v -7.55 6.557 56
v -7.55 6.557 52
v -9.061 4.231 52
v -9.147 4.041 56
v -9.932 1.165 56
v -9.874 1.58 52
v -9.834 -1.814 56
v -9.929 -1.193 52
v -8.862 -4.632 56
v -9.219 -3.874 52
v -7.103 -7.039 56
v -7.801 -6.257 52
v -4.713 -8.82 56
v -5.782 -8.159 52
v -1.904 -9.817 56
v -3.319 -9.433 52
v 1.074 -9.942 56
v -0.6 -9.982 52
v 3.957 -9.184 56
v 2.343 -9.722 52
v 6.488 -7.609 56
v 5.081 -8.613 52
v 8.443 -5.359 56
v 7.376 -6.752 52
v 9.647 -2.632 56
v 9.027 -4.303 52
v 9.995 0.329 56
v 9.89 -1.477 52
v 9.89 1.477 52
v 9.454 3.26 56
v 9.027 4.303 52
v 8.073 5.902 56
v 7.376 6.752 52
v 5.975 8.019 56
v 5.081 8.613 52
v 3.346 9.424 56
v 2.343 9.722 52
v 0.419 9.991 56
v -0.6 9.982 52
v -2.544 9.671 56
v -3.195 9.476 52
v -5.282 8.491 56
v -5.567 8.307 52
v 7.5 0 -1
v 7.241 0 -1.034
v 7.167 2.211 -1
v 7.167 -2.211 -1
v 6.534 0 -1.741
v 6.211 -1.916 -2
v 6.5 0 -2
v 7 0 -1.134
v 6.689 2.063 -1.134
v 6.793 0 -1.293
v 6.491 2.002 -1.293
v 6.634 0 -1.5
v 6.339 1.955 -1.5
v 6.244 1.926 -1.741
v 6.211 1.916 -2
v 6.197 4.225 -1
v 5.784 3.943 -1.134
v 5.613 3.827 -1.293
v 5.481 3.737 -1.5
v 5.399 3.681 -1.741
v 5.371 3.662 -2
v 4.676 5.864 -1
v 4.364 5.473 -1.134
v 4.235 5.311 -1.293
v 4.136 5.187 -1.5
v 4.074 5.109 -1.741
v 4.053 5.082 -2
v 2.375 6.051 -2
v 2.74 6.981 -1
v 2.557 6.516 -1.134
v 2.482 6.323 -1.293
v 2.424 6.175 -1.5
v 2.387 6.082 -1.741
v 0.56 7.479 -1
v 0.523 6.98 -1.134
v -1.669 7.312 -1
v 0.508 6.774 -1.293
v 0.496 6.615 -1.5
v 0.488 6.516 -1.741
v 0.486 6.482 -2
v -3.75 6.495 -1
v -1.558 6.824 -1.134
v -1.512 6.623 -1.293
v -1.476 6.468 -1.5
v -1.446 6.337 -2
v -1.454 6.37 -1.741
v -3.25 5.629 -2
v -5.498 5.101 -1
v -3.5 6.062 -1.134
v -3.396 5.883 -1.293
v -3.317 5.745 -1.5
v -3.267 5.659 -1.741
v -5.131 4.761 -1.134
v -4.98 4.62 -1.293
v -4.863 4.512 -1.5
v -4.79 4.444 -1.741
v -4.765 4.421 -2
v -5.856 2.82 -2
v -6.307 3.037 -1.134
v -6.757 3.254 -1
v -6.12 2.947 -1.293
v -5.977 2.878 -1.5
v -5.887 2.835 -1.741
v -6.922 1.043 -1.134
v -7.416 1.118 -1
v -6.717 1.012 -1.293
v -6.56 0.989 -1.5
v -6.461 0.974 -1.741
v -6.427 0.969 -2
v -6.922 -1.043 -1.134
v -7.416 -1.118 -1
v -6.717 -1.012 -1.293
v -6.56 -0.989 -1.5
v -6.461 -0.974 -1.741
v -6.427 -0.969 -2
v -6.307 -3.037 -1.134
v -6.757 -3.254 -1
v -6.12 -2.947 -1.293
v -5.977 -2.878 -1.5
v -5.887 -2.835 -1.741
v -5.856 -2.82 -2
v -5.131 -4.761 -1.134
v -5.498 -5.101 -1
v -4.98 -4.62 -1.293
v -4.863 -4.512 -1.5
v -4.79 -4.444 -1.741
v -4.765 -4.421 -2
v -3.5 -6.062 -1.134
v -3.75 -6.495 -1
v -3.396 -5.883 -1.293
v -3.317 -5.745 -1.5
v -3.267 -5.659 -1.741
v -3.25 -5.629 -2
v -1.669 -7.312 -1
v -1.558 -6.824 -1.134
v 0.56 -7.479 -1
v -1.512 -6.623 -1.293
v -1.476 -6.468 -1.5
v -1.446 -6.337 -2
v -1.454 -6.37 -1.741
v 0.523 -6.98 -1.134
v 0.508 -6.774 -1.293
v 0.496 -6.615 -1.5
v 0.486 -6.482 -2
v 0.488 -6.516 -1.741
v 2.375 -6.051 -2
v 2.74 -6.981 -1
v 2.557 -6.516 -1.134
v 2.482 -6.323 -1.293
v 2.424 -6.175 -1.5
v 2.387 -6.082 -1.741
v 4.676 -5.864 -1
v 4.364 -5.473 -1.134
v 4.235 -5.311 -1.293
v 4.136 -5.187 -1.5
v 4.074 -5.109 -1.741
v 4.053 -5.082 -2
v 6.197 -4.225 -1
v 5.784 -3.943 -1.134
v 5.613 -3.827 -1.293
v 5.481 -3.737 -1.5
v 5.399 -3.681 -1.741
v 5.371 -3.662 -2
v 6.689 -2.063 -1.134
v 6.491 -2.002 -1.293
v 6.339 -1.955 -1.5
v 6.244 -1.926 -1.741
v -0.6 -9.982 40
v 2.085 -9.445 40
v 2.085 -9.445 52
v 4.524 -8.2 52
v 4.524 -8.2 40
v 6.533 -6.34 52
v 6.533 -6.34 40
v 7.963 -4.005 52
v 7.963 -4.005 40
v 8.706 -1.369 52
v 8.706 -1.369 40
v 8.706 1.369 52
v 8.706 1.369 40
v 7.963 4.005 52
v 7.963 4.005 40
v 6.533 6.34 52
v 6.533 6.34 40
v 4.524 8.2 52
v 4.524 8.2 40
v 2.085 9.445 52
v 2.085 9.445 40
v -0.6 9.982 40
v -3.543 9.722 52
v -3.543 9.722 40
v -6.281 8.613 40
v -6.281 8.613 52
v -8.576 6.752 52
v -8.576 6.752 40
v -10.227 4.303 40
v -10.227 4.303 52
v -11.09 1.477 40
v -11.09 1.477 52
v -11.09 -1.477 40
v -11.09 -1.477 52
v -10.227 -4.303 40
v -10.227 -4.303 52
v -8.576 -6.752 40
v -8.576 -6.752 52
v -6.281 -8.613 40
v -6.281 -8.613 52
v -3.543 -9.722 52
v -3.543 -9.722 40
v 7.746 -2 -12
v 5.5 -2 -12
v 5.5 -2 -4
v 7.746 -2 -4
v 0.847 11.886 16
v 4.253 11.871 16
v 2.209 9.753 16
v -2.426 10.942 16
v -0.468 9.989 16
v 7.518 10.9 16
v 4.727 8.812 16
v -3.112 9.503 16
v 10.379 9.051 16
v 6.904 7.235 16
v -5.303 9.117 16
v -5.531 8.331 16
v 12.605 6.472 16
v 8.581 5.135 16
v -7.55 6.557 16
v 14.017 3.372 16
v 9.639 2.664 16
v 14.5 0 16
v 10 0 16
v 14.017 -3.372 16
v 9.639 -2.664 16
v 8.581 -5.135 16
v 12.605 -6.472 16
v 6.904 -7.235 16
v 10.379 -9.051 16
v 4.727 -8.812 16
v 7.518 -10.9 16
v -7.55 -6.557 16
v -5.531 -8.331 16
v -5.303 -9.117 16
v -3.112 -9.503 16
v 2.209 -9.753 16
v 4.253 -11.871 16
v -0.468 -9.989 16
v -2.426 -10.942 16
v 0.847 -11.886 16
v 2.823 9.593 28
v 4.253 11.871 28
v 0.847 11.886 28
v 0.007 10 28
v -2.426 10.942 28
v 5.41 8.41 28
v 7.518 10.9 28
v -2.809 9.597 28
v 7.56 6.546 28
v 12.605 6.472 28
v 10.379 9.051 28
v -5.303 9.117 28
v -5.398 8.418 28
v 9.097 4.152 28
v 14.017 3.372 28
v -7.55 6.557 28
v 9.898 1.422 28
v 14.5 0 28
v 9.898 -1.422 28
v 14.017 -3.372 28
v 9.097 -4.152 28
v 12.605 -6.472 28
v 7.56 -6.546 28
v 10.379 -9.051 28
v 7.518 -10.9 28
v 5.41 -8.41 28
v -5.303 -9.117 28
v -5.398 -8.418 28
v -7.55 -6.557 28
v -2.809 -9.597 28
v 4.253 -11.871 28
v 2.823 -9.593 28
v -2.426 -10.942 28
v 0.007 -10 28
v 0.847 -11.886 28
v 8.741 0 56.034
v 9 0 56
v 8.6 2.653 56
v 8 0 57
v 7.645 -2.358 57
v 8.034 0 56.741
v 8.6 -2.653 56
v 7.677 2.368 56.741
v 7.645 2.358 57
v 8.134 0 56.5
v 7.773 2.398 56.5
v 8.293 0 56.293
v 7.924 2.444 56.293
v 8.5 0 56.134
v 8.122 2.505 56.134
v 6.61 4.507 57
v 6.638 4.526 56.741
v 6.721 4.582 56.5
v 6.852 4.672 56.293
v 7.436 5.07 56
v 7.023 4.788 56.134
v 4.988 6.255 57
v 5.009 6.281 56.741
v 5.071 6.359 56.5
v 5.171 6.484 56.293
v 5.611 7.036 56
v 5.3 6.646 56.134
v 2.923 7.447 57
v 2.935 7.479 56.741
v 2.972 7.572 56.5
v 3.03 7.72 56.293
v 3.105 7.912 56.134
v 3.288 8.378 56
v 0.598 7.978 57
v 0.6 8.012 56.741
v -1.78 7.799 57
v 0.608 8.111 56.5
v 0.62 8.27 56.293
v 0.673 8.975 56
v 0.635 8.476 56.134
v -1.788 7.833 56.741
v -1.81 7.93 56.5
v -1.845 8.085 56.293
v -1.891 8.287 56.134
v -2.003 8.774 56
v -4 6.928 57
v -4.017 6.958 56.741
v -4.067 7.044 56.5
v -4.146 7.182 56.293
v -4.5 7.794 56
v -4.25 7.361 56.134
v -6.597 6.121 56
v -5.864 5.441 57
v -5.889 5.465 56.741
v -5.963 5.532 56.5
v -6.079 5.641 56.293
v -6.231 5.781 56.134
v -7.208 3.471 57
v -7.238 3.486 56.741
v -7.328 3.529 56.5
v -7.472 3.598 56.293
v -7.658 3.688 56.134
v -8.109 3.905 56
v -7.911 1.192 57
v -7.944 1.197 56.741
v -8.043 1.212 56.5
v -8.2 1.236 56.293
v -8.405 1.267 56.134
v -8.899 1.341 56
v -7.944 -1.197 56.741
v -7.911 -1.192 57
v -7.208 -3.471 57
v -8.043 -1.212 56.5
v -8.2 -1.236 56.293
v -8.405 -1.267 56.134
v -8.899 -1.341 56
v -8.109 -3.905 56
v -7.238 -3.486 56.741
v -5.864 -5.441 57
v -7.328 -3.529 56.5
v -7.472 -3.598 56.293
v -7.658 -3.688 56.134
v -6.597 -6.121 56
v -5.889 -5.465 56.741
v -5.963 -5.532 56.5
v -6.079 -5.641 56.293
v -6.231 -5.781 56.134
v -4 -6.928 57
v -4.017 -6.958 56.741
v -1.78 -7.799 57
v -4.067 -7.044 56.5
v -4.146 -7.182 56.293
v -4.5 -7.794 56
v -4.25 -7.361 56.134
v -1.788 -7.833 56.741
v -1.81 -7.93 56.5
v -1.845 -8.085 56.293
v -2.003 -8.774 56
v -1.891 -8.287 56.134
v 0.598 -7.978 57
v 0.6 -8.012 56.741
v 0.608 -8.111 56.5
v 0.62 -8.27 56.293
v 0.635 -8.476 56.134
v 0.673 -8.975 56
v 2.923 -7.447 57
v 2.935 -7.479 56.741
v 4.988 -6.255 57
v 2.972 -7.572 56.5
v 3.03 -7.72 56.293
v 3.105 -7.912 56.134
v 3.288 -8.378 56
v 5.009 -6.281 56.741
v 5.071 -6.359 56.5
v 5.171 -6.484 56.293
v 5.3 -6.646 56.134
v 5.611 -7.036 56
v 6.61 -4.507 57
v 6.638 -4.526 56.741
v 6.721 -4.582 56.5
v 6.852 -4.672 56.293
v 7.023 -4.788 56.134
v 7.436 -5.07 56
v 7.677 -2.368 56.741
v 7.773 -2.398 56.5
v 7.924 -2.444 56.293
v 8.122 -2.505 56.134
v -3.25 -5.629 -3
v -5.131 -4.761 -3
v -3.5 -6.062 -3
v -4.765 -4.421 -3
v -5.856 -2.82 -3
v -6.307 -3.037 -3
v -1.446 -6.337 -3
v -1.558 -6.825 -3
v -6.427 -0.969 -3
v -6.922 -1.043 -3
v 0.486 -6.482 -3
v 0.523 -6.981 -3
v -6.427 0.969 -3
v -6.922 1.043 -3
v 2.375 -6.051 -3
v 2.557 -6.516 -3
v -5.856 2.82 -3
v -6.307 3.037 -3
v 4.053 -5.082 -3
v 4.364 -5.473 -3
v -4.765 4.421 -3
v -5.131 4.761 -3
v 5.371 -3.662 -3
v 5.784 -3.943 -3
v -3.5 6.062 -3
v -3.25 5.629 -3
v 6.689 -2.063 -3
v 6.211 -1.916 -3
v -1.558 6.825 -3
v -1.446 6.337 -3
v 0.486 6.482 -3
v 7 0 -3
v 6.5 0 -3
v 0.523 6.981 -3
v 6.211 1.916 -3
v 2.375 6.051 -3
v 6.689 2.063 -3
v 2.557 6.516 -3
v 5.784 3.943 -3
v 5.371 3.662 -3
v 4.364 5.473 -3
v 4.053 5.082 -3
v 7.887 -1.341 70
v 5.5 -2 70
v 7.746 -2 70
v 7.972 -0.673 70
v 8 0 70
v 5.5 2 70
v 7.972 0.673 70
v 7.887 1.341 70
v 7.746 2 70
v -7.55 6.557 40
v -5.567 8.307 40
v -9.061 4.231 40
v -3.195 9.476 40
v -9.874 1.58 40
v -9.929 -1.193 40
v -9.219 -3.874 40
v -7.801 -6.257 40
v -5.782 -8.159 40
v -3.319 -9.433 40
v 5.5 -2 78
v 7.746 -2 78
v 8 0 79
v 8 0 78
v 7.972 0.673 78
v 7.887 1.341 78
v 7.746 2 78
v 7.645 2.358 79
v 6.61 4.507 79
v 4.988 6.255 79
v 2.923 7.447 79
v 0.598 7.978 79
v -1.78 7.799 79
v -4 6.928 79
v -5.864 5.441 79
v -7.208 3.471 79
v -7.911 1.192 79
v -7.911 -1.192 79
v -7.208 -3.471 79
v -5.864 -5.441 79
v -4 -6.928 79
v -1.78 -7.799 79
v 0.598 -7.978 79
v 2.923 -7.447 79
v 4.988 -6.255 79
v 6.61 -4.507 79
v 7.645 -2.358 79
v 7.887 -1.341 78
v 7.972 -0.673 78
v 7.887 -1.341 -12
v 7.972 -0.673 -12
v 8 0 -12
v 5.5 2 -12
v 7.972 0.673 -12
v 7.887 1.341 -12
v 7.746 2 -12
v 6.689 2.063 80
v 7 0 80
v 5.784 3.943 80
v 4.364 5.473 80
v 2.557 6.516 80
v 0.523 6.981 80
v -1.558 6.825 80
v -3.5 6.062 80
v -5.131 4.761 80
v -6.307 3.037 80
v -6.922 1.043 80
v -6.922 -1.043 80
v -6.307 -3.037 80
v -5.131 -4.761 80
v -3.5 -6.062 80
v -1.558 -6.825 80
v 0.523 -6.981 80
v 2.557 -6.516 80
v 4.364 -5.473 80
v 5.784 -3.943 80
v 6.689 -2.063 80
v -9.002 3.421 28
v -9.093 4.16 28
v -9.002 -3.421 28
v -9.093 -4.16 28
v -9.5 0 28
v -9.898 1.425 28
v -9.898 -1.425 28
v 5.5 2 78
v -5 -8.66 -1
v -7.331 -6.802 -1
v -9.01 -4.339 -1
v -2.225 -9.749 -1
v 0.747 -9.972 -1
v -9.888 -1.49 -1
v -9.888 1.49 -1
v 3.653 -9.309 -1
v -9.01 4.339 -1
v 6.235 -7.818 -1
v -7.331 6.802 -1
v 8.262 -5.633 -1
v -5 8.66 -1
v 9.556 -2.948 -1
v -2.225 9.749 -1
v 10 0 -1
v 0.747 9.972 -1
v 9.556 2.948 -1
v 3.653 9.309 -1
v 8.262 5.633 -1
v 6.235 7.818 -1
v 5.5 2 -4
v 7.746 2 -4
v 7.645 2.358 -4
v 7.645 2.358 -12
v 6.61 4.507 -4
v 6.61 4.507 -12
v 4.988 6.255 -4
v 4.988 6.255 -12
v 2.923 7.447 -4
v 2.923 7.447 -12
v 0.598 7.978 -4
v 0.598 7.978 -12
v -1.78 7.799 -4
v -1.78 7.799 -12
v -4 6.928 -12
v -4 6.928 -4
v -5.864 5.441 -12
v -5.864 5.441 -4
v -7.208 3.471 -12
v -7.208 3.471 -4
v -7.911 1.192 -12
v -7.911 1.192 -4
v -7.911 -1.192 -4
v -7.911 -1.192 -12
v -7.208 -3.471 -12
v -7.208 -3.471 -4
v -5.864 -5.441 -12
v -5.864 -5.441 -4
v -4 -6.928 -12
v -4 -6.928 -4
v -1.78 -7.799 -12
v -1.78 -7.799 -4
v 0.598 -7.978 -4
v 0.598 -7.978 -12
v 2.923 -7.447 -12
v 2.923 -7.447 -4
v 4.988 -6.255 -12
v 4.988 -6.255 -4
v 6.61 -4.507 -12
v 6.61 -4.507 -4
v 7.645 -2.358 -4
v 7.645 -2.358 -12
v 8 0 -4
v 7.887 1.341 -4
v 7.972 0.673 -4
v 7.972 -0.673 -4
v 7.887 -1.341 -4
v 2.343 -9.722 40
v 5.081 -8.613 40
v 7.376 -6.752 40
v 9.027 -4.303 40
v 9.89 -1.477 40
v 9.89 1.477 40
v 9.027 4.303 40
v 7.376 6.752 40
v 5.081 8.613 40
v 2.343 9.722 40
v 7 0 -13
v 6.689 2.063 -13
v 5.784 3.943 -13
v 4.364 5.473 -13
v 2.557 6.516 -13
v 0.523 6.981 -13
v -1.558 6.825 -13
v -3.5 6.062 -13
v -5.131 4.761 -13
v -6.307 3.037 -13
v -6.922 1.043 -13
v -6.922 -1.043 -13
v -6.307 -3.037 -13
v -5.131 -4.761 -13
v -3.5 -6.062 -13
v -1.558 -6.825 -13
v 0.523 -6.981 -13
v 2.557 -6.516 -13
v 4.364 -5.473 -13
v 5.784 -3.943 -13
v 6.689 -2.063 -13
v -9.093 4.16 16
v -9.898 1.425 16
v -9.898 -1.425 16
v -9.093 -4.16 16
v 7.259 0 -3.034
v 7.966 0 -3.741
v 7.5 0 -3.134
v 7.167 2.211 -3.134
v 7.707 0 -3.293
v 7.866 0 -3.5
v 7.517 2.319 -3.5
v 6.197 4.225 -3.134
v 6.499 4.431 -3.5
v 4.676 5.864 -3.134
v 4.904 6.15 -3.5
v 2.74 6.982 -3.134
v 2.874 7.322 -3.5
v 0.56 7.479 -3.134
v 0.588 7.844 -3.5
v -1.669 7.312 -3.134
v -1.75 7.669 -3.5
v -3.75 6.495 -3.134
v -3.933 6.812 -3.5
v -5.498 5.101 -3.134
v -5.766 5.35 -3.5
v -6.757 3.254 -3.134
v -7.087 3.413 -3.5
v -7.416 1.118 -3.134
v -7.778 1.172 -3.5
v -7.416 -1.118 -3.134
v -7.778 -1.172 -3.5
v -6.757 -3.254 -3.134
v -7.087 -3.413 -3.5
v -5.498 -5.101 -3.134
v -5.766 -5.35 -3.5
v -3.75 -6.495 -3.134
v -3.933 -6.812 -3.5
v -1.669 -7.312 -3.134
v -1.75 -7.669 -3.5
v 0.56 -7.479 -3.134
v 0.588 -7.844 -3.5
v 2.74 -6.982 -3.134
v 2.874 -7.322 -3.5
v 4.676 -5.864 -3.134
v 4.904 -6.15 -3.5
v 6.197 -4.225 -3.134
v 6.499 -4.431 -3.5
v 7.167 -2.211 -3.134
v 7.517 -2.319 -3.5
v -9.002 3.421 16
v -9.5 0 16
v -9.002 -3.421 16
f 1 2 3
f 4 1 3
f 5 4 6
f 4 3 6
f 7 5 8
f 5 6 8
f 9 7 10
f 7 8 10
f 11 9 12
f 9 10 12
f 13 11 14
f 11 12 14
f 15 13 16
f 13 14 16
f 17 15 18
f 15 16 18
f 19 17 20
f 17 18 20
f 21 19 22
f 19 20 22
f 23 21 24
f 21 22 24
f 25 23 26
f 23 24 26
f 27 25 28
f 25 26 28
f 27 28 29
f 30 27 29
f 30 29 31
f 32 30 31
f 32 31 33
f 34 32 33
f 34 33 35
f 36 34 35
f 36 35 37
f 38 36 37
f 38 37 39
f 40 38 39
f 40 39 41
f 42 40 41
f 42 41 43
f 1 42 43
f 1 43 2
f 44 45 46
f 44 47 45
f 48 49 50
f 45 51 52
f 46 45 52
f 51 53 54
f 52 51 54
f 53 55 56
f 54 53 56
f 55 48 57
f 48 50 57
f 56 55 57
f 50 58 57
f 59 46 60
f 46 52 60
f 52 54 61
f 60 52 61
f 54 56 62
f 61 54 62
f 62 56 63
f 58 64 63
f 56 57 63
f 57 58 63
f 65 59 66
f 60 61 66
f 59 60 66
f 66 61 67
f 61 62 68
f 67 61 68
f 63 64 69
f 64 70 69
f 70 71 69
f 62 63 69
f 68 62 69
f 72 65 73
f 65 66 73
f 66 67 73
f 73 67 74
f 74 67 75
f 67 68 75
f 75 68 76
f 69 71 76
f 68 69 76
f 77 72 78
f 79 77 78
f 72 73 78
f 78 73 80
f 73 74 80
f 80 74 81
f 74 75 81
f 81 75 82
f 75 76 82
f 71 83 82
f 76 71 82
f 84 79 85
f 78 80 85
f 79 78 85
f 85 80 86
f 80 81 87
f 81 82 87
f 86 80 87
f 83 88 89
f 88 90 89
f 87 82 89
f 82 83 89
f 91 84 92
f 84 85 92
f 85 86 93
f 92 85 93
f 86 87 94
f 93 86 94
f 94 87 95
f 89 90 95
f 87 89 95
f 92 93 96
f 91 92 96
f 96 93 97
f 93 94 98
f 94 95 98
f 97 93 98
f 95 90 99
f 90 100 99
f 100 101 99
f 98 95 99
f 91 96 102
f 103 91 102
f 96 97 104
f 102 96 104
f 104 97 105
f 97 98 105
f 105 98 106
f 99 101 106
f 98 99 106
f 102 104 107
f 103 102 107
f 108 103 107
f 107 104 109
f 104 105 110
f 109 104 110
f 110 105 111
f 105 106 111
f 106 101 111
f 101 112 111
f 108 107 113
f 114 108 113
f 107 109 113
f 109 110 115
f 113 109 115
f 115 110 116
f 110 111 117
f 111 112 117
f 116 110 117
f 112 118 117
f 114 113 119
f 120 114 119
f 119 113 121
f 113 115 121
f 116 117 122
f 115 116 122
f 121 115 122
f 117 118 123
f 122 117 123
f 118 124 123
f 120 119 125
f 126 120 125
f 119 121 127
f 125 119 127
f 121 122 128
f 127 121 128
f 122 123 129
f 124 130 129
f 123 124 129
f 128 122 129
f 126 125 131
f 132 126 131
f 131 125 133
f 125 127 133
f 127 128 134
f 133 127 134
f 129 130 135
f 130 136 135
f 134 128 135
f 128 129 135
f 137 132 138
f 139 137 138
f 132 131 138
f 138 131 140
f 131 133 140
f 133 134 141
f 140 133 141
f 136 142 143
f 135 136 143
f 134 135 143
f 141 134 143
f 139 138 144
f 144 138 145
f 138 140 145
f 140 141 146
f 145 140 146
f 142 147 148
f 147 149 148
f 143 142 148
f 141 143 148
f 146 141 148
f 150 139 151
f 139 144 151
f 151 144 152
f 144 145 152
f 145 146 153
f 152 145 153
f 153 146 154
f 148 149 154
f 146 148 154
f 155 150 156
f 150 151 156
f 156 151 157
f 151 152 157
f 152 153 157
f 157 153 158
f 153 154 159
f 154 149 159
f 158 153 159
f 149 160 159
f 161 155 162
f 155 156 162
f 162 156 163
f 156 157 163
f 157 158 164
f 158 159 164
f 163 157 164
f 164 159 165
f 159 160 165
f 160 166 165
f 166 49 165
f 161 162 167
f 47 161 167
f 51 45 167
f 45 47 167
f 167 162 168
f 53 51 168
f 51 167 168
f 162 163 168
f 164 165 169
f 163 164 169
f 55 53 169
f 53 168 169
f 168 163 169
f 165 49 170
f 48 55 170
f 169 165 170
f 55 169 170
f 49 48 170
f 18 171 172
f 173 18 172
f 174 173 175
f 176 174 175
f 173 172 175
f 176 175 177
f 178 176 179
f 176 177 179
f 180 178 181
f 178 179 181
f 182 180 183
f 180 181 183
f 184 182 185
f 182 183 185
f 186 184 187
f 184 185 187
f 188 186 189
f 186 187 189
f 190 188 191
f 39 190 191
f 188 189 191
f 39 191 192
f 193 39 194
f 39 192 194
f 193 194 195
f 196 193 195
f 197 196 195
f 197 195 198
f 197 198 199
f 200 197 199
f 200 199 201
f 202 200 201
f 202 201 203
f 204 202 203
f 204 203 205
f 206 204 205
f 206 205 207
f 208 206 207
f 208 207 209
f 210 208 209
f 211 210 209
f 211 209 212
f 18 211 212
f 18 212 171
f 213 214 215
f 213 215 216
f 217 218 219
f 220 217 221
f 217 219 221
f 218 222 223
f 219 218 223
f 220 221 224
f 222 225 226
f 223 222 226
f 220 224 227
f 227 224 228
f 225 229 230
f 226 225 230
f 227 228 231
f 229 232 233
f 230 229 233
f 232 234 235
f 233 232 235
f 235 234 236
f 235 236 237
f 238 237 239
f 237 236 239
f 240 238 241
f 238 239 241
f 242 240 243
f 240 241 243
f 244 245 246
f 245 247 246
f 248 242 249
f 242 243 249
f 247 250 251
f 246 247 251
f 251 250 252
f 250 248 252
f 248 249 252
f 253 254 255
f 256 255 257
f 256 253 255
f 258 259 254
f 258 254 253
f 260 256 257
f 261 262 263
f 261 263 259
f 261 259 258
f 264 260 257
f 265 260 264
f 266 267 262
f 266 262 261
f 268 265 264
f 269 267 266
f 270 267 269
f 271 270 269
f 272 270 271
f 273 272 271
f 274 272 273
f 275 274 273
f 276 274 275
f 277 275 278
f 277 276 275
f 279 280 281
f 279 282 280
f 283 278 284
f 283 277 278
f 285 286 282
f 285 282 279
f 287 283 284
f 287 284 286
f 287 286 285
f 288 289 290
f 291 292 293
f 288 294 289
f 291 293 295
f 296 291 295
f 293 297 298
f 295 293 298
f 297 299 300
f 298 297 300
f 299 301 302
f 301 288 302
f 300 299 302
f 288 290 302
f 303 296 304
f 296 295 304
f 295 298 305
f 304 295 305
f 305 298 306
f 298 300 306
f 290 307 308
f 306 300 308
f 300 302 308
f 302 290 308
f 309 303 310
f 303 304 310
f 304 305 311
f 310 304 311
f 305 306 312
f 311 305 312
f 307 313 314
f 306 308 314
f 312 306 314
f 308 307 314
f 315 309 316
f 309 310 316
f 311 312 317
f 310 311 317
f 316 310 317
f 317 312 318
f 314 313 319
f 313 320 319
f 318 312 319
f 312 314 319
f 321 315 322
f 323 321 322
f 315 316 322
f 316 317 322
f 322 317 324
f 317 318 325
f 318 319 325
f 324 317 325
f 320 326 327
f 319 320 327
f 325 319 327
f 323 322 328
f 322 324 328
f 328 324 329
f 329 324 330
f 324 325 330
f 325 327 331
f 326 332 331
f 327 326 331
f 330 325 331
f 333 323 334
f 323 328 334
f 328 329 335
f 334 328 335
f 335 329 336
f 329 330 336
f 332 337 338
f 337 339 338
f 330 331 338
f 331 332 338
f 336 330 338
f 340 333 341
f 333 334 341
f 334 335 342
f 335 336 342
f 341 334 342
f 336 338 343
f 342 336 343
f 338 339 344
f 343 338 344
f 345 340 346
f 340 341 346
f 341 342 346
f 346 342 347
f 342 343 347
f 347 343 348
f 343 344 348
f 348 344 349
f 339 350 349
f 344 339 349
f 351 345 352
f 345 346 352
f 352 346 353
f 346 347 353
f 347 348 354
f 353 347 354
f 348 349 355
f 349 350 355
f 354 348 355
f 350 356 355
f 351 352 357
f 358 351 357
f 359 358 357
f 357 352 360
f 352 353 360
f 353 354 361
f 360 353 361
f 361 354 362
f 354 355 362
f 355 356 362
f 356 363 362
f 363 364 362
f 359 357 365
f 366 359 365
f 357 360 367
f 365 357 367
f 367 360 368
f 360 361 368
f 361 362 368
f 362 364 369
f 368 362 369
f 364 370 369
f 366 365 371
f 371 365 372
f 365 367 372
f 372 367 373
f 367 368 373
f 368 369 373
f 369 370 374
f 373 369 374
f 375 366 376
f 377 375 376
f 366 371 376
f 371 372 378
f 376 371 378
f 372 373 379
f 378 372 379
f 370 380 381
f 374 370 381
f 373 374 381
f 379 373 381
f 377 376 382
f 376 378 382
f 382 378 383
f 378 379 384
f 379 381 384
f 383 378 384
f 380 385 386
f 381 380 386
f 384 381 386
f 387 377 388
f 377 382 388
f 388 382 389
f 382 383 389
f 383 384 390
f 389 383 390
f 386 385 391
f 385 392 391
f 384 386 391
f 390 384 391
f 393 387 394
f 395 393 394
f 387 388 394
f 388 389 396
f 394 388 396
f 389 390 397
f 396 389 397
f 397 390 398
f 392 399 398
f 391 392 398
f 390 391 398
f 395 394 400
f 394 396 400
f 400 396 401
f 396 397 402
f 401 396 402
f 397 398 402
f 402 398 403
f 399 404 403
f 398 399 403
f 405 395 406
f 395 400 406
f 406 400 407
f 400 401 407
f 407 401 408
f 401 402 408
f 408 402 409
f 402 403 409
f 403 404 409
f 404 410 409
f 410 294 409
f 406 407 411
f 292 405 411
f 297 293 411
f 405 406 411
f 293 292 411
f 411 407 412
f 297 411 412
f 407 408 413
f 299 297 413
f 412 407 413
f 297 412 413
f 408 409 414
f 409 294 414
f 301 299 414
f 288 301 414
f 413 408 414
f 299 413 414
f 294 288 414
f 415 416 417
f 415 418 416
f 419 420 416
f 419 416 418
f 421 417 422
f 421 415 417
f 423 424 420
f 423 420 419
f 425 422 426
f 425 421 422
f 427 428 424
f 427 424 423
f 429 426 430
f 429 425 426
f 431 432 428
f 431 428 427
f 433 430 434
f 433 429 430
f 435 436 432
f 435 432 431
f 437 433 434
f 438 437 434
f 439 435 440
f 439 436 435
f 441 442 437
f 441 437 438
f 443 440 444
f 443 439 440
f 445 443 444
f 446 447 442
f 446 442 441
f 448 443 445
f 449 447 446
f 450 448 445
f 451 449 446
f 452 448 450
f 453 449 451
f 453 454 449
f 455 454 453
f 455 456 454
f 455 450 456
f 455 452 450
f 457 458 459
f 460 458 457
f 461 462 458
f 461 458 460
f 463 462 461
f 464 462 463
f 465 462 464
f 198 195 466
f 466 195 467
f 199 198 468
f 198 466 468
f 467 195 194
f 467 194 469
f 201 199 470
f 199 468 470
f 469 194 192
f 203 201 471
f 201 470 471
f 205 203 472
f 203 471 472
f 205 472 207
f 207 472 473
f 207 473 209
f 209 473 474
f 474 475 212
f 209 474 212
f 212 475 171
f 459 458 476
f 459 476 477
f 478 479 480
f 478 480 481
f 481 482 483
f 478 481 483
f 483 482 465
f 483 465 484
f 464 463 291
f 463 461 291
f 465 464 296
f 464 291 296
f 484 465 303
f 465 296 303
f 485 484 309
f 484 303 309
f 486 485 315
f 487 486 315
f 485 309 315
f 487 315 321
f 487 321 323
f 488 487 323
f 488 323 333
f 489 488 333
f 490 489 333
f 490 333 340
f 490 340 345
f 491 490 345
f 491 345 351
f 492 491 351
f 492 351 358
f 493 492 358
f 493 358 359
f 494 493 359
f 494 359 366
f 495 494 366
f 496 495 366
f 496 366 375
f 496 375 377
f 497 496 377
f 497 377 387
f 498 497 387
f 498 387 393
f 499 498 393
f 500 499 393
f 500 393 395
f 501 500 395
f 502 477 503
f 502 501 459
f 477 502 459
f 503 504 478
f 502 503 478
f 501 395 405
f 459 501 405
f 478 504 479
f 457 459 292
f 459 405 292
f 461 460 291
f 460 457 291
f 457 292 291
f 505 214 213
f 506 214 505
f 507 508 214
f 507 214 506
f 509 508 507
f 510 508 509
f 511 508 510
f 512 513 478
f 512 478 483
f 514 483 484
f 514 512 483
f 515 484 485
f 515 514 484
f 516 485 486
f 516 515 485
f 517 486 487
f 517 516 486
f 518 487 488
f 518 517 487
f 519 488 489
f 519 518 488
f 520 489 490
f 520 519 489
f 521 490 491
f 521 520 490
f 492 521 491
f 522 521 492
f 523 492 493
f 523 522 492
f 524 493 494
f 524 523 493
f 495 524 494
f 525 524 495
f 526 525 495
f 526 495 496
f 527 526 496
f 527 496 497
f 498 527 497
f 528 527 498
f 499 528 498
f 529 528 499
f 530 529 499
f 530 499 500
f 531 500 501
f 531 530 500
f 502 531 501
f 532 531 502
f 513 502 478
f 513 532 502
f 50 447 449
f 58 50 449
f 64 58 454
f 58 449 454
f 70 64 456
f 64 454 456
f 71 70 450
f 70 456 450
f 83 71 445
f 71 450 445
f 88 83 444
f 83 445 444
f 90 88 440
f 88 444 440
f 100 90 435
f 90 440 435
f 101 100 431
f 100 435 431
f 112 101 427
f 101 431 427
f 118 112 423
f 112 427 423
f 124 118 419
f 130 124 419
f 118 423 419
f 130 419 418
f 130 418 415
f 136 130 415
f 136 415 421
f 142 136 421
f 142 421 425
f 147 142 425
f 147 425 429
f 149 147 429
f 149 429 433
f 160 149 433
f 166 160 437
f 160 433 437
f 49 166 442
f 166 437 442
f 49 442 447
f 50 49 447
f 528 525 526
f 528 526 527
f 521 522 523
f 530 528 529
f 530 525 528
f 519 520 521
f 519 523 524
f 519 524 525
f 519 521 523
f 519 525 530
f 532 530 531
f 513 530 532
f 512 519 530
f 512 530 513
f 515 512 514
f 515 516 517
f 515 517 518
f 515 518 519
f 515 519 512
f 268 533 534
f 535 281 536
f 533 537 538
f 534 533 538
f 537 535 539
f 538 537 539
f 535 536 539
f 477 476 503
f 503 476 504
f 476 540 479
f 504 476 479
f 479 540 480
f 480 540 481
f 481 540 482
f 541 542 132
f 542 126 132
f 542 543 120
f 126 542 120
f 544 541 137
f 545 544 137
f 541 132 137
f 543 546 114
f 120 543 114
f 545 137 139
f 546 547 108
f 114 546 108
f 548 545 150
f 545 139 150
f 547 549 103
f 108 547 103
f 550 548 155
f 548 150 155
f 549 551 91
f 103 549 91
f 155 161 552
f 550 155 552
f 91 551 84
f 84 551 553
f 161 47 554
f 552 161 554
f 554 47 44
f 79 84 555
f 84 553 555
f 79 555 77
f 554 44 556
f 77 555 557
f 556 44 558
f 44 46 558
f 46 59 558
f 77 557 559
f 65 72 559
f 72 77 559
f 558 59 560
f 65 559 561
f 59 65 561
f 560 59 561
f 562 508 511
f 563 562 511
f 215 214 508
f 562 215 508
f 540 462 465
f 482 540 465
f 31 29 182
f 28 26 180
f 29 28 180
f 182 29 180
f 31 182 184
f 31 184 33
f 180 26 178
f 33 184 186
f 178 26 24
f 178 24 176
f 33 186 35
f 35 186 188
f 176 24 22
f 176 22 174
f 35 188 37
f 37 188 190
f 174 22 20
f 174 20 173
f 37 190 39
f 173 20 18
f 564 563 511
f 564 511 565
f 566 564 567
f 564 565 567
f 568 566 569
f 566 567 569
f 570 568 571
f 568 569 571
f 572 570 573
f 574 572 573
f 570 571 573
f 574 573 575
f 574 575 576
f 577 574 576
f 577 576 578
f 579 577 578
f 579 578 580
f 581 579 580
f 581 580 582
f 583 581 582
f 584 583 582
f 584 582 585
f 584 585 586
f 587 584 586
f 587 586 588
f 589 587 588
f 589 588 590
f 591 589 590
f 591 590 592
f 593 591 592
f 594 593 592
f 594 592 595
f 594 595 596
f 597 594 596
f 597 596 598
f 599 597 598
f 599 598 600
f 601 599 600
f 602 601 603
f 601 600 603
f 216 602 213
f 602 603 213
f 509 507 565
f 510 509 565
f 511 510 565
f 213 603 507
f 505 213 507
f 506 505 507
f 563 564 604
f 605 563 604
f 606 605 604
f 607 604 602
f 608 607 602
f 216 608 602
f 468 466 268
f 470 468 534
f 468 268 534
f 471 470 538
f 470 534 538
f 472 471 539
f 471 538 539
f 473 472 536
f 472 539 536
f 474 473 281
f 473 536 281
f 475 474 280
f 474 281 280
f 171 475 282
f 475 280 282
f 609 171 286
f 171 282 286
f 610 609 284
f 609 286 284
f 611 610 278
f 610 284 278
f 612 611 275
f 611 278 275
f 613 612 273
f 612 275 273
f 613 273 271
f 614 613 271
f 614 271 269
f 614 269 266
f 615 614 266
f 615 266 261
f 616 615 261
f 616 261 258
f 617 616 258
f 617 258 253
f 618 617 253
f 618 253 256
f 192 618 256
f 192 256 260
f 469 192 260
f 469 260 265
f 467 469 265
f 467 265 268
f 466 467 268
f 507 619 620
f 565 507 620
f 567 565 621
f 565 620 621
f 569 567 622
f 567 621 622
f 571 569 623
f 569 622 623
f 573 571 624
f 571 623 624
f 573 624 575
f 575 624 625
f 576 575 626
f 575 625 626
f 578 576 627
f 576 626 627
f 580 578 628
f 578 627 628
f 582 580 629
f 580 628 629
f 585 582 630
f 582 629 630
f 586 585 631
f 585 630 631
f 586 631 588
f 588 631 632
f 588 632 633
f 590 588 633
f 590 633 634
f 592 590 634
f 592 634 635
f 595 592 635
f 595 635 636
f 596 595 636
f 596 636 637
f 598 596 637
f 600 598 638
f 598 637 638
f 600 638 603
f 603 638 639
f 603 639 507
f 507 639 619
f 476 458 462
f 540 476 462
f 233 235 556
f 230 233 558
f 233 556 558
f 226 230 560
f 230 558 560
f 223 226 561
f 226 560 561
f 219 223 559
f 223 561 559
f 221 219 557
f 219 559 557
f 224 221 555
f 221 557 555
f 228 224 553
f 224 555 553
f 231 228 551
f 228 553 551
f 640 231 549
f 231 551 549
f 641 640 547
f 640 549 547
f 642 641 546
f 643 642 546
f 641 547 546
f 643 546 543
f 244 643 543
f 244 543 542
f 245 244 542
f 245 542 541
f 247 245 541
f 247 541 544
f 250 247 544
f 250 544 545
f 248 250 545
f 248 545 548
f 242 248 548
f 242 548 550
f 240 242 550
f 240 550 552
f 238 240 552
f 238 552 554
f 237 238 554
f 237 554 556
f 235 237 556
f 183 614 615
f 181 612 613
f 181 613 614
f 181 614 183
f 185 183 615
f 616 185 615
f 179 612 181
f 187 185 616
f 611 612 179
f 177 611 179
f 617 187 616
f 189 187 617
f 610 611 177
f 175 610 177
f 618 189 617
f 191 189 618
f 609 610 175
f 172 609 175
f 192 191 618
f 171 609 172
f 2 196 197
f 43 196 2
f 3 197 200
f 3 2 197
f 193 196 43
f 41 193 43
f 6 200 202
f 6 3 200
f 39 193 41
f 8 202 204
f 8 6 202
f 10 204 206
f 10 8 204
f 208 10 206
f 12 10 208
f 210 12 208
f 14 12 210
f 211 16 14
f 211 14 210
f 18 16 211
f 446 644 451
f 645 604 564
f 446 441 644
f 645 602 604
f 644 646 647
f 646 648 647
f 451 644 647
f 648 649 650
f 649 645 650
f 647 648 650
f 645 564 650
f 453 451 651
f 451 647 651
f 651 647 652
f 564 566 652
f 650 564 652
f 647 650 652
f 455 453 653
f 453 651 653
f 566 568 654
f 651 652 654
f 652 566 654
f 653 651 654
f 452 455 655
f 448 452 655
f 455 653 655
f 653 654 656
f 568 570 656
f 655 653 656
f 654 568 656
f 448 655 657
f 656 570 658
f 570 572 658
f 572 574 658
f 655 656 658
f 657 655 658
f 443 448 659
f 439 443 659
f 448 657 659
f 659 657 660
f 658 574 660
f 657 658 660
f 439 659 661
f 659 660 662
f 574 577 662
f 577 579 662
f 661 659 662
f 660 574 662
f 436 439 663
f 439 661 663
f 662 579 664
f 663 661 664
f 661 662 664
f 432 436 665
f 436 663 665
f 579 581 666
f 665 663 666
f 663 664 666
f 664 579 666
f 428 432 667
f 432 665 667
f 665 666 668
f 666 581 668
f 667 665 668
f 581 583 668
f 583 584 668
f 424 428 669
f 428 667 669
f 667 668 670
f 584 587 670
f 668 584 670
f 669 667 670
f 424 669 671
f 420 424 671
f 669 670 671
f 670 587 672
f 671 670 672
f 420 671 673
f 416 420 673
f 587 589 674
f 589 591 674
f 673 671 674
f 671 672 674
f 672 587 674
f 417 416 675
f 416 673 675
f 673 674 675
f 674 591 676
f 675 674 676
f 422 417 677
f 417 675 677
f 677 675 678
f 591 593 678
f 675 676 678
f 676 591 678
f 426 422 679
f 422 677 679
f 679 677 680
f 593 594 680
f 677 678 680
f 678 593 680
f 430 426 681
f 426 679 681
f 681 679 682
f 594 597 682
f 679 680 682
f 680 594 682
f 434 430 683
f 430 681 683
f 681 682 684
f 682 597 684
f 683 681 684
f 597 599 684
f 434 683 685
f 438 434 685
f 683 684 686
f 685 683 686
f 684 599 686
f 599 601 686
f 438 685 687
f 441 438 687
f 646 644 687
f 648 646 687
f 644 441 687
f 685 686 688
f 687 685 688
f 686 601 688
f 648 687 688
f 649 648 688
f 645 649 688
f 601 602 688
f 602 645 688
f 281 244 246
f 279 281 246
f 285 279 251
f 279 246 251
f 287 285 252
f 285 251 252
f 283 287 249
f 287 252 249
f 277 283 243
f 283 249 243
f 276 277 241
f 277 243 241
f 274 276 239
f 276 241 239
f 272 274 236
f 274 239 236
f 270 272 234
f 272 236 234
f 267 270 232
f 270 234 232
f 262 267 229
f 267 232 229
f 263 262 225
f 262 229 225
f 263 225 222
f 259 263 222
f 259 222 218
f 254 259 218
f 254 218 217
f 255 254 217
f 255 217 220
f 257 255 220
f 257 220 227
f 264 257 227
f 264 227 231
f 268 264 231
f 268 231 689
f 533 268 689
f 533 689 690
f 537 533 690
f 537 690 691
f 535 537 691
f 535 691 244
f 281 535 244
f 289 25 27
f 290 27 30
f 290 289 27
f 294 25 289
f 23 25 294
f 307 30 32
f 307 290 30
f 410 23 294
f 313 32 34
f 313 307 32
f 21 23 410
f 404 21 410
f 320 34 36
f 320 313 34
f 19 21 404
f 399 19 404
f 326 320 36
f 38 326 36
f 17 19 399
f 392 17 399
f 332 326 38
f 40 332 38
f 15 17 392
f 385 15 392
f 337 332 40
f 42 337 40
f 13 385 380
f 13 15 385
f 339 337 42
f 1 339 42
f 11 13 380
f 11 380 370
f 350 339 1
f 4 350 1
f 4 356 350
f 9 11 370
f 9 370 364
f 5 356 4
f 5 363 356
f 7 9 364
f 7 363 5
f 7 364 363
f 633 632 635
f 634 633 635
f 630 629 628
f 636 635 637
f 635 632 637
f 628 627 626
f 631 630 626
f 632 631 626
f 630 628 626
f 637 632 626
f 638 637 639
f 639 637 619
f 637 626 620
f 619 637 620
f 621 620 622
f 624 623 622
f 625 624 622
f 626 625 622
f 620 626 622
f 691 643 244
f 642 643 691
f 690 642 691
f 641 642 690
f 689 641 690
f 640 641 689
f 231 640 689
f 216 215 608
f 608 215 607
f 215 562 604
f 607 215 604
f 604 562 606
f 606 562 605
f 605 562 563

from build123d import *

# Parameters (mm, degrees)
SKETCH_1_R          = 8
EXTRUDE_1_DEPTH     = 10
SKETCH_2_R          = 6.5
EXTRUDE_2_DEPTH     = 2
SKETCH_3_R          = 10
EXTRUDE_3_DEPTH     = 17
SKETCH_4_R          = 12
EXTRUDE_4_DEPTH     = 12
SKETCH_5_R          = 10
EXTRUDE_5_DEPTH     = 12
SKETCH_6_R          = 10
EXTRUDE_6_DEPTH     = 12
SKETCH_7_R          = 10
EXTRUDE_7_DEPTH     = 4
SKETCH_8_R          = 8
EXTRUDE_8_DEPTH     = 24
SKETCH_9_W          = 5.5
SKETCH_9_H          = 4
CUT_EXTRUDE_1_DEPTH = 8
SKETCH_10_W         = 5.5
SKETCH_10_H         = 4
CUT_EXTRUDE_2_DEPTH = 8
CHAMFER_1_SIZE      = 1
FILLET_1_R          = 1


with BuildPart() as part:
    # 草图1 → 凸台-拉伸1 (new body)
    with BuildSketch(Plane.XY.offset(-13)):
        Circle(SKETCH_1_R)
    extrude(amount=EXTRUDE_1_DEPTH)

    # 草图2 → 凸台-拉伸2 (add)
    with BuildSketch(Plane.XY.offset(-3)):
        Circle(SKETCH_2_R)
    extrude(amount=EXTRUDE_2_DEPTH)

    # 草图3 → 凸台-拉伸3 (add)
    with BuildSketch(Plane.XY.offset(-1)):
        Circle(SKETCH_3_R)
    extrude(amount=EXTRUDE_3_DEPTH)

    # 草图4 → 凸台-拉伸4 (add)
    with BuildSketch(Plane.XY.offset(16)):
        with Locations(Location((2.5, 0, 0), (0, 0, 213.122940208))):
            Circle(SKETCH_4_R)
    extrude(amount=EXTRUDE_4_DEPTH)

    # 草图5 → 凸台-拉伸5 (add)
    with BuildSketch(Plane.XY.offset(28)):
        with Locations(Location((0, 0, 0), (0, 0, 139.025369771))):
            Circle(SKETCH_5_R)
    extrude(amount=EXTRUDE_5_DEPTH)

    # 草图6 → 凸台-拉伸6 (add)
    with BuildSketch(Plane.XY.offset(40)):
        with Locations(Location((-1.2, 0, 0), (0, 0, 273.439812768))):
            Circle(SKETCH_6_R)
    extrude(amount=EXTRUDE_6_DEPTH)

    # 草图7 → 凸台-拉伸7 (add)
    with BuildSketch(Plane.XY.offset(52)):
        with Locations(Location((0, 0, 0), (0, 0, 139.025369771))):
            Circle(SKETCH_7_R)
    extrude(amount=EXTRUDE_7_DEPTH)

    # 草图8 → 凸台-拉伸8 (add)
    with BuildSketch(Plane.XY.offset(56)):
        Circle(SKETCH_8_R)
    extrude(amount=EXTRUDE_8_DEPTH)

    # 草图9 → 切除-拉伸1 (cut)
    with BuildSketch(Plane.XY.offset(-12)):
        with Locations((8.25, 0)):
            Rectangle(SKETCH_9_W, SKETCH_9_H)
    extrude(amount=CUT_EXTRUDE_1_DEPTH, mode=Mode.SUBTRACT)

    # 草图10 → 切除-拉伸2 (cut)
    with BuildSketch(Plane.XY.offset(70)):
        with Locations((8.25, 0)):
            Rectangle(SKETCH_10_W, SKETCH_10_H)
    extrude(amount=CUT_EXTRUDE_2_DEPTH, mode=Mode.SUBTRACT)

    # 倒角1
    chamfer_1_edges = [part.edges().sort_by_distance(p)[0] for p in [
        (-8, 0, -13),
        (-8, 0, 80),
    ]]
    chamfer(chamfer_1_edges, length=CHAMFER_1_SIZE - 0.0001)  # a hair under: the kernel refuses the full size

    # 圆角1
    fillet_1_edges = [part.edges().sort_by_distance(p)[0] for p in [
        (-8, 0, 56),
        (-8, 0, -3),
        (-6.5, 0, -1),
    ]]
    fillet(fillet_1_edges, radius=FILLET_1_R - 0.0001)  # a hair under: the kernel refuses the full size


solid = part.part
